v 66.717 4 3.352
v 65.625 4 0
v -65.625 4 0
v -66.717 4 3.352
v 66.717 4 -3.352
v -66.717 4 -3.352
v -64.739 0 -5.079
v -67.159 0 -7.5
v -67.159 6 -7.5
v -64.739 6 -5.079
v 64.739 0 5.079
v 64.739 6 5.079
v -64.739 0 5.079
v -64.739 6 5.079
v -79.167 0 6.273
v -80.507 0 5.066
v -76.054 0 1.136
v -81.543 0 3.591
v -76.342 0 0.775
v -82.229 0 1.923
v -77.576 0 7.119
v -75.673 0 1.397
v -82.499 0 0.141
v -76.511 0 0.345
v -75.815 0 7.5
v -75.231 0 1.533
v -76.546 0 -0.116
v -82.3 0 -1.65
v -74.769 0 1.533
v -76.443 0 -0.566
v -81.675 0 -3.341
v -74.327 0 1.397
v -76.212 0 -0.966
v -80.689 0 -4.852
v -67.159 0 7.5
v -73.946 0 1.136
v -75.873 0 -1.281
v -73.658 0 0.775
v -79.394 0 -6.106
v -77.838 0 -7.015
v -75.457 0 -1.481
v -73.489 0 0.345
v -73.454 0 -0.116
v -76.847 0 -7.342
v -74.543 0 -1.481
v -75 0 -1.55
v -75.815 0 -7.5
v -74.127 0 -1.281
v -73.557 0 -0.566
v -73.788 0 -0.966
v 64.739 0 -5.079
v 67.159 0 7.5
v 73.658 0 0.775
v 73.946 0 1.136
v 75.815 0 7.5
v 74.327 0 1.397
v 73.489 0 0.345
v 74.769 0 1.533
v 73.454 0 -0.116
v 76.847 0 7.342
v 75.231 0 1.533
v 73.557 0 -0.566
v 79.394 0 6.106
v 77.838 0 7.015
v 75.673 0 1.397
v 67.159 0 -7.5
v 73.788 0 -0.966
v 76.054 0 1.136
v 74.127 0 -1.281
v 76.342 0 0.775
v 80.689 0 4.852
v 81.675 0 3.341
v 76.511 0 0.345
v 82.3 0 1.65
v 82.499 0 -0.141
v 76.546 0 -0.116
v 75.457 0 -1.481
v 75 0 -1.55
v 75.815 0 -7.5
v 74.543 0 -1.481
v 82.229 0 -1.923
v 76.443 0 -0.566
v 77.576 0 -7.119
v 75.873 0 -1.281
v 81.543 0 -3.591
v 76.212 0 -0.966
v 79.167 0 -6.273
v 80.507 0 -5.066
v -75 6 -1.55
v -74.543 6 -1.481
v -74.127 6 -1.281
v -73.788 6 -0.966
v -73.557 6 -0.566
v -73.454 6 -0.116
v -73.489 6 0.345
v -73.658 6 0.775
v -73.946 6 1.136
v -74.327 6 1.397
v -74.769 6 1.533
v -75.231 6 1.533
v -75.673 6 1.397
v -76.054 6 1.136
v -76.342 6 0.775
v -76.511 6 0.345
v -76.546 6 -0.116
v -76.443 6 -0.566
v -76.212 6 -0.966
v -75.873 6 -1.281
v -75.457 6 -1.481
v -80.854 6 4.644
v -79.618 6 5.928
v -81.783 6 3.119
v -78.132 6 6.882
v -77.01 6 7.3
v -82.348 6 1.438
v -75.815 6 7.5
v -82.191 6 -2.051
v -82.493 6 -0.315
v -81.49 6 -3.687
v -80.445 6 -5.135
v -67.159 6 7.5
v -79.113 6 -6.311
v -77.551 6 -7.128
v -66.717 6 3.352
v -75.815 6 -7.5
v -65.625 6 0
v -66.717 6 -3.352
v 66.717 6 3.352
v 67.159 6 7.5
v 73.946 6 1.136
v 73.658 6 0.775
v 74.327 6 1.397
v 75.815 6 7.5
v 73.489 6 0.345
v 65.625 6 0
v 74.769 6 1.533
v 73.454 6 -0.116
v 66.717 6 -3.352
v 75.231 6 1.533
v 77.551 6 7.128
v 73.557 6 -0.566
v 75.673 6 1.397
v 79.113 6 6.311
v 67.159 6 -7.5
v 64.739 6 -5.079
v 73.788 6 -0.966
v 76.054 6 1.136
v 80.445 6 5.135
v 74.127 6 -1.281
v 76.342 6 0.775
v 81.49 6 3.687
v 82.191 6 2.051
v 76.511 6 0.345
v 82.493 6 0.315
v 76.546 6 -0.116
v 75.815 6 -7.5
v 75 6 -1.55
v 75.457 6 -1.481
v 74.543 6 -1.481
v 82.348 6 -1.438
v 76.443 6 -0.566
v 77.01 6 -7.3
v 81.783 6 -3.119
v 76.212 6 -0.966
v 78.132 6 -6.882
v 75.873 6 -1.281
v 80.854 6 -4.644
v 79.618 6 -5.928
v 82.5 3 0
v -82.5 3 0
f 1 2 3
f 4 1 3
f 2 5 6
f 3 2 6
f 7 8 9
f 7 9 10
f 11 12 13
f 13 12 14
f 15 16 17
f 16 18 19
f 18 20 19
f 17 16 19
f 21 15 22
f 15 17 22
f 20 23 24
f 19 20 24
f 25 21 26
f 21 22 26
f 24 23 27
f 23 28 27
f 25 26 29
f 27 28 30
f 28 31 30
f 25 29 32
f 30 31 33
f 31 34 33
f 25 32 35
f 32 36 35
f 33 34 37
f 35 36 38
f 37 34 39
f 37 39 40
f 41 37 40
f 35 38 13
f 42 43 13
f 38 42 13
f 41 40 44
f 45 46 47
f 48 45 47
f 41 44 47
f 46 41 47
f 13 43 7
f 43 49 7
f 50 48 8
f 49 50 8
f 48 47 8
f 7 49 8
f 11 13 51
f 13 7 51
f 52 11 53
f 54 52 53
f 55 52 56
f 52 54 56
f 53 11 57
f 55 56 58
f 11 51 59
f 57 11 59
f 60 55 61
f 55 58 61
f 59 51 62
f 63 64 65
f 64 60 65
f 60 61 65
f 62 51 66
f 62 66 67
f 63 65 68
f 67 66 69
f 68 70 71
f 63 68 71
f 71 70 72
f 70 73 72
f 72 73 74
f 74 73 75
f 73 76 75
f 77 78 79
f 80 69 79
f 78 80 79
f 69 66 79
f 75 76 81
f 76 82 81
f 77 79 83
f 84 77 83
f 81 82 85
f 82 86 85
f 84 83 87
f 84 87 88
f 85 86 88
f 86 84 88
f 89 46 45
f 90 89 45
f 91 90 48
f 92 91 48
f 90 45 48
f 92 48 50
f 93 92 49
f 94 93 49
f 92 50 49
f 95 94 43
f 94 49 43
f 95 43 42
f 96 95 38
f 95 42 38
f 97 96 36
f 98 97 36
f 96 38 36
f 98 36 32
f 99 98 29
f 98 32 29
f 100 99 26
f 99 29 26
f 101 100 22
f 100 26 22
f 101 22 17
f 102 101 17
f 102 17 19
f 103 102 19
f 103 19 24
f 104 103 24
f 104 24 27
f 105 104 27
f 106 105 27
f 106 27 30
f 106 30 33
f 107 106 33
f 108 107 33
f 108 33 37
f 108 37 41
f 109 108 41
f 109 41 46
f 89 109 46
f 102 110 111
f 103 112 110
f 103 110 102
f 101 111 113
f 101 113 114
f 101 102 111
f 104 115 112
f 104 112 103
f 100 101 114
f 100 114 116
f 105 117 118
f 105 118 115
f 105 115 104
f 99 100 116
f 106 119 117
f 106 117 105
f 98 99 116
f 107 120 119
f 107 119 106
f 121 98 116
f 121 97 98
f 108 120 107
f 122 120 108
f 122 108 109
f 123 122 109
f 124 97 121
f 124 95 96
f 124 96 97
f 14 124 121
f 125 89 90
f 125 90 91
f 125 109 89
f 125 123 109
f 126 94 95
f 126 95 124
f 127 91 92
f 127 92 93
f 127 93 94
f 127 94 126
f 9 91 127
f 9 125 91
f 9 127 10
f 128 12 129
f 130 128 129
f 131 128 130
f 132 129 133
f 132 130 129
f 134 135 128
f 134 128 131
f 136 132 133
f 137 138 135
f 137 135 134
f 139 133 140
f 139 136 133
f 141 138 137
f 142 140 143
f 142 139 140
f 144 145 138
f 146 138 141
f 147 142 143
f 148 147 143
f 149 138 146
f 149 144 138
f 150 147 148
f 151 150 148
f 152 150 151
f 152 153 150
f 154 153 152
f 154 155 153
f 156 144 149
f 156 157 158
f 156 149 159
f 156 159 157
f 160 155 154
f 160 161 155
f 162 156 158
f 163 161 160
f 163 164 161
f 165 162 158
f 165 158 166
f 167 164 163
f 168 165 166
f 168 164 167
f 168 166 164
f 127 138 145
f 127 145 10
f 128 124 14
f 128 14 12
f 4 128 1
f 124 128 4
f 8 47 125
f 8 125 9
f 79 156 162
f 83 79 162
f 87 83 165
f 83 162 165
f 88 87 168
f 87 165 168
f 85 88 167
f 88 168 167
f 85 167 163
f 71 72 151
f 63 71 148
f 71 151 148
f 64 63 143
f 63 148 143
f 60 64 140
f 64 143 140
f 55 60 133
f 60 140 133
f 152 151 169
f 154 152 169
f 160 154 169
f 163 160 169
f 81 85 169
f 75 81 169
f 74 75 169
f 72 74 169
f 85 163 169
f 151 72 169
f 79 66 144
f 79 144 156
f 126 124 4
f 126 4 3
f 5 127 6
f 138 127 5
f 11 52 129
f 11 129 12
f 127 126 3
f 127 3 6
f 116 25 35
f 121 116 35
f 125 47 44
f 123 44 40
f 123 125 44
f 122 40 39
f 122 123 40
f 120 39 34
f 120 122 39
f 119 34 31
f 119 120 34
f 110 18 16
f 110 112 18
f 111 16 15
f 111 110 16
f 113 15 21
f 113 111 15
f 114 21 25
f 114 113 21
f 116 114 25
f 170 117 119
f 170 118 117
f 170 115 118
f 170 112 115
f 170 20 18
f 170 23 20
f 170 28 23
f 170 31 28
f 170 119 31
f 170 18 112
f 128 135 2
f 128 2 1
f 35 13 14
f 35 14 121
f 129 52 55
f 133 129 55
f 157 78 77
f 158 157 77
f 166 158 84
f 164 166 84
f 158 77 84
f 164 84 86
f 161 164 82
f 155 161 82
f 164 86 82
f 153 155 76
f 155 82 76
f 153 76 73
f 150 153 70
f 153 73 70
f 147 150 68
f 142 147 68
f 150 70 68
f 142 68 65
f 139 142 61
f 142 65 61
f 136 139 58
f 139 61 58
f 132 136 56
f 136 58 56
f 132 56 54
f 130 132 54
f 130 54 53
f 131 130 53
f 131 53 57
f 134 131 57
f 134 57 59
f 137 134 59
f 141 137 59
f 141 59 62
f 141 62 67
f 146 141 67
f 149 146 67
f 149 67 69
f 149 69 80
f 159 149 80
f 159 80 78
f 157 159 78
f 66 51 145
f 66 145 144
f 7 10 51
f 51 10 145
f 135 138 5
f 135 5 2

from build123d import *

# Parameters (mm, degrees)
ESQUISSE1_W             = 165
ESQUISSE1_H             = 15
BOSS_EXTRU_1_DEPTH      = 6
ESQUISSE4_W             = 180.64112288
ESQUISSE4_H             = 30
ENL_V_MAT_EXTRU_1_DEPTH = 12
ESQUISSE3_R             = 1.55
ENL_V_MAT_EXTRU_2_DEPTH = 12
ENL_V_MAT_EXTRU_3_DEPTH = 2


with BuildPart() as part:
    # Esquisse1 → Boss.-Extru.1 (new body)
    with BuildSketch(Plane(origin=(0, 0, 0), x_dir=(1, 0, 0), z_dir=(0, 1, 0))):
        Rectangle(ESQUISSE1_W, ESQUISSE1_H)
    extrude(amount=BOSS_EXTRU_1_DEPTH)

    # Esquisse4 → Enlèv. mat.-Extru.1 (cut)
    with BuildSketch(Plane(origin=(0, 6, 0), x_dir=(1, 0, 0), z_dir=(0, 1, 0))):
        Rectangle(ESQUISSE4_W, ESQUISSE4_H)
        with BuildLine():
            Line((-67.159158072, 7.5), (-64.738516234, 5.079358161))
            Line((-64.738516234, 5.079358161), (64.738516234, 5.079358161))
            Line((64.738516234, 5.079358161), (67.159158072, 7.5))
            Line((67.159158072, 7.5), (75, 7.5))
            add(Edge.make_bspline(
                [(75, 7.5), (79.08518124, 7.773957054), (85.914818759, -1e-09), (79.085181242, -7.773957053), (75, -7.5)],
                knots=[0, 0, 0, 0, 0.5, 1, 1, 1, 1], degree=3))
            Line((75, -7.5), (67.159158072, -7.5))
            Line((67.159158072, -7.5), (64.738516234, -5.079358161))
            Line((64.738516234, -5.079358161), (-64.738516234, -5.079358161))
            Line((-64.738516234, -5.079358161), (-67.159158072, -7.5))
            Line((-67.159158072, -7.5), (-75, -7.5))
            add(Edge.make_bspline(
                [(-75, 7.5), (-79.08518124, 7.773957054), (-85.914818759, -1e-09), (-79.085181242, -7.773957053), (-75, -7.5)],
                knots=[0, 0, 0, 0, 0.5, 1, 1, 1, 1], degree=3))
            Line((-75, 7.5), (-67.159158072, 7.5))
        make_face(mode=Mode.SUBTRACT)
    extrude(amount=-ENL_V_MAT_EXTRU_1_DEPTH, mode=Mode.SUBTRACT)

    # Esquisse3 → Enlèv. mat.-Extru.2 (cut)
    with BuildSketch(Plane.XZ):
        with Locations(Location((-75, 0, 0), (0, 0, 270))):
            Circle(ESQUISSE3_R)
        with Locations(Location((75, 0, 0), (0, 0, 270))):
            Circle(ESQUISSE3_R)
    extrude(amount=-ENL_V_MAT_EXTRU_2_DEPTH, mode=Mode.SUBTRACT)

    # Esquisse5 → Enlèv. mat.-Extru.3 (cut)
    with BuildSketch(Plane(origin=(0, 6, 0), x_dir=(1, 0, 0), z_dir=(0, 1, 0))):
        Polygon((-65.624952607, 0), (-66.717415088, 3.351936497), (66.717415088, 3.351936497), (65.624952607, 0), (66.717415088, -3.351936497), (-66.717415088, -3.351936497), align=None)
    extrude(amount=-ENL_V_MAT_EXTRU_3_DEPTH, mode=Mode.SUBTRACT)


solid = part.part
